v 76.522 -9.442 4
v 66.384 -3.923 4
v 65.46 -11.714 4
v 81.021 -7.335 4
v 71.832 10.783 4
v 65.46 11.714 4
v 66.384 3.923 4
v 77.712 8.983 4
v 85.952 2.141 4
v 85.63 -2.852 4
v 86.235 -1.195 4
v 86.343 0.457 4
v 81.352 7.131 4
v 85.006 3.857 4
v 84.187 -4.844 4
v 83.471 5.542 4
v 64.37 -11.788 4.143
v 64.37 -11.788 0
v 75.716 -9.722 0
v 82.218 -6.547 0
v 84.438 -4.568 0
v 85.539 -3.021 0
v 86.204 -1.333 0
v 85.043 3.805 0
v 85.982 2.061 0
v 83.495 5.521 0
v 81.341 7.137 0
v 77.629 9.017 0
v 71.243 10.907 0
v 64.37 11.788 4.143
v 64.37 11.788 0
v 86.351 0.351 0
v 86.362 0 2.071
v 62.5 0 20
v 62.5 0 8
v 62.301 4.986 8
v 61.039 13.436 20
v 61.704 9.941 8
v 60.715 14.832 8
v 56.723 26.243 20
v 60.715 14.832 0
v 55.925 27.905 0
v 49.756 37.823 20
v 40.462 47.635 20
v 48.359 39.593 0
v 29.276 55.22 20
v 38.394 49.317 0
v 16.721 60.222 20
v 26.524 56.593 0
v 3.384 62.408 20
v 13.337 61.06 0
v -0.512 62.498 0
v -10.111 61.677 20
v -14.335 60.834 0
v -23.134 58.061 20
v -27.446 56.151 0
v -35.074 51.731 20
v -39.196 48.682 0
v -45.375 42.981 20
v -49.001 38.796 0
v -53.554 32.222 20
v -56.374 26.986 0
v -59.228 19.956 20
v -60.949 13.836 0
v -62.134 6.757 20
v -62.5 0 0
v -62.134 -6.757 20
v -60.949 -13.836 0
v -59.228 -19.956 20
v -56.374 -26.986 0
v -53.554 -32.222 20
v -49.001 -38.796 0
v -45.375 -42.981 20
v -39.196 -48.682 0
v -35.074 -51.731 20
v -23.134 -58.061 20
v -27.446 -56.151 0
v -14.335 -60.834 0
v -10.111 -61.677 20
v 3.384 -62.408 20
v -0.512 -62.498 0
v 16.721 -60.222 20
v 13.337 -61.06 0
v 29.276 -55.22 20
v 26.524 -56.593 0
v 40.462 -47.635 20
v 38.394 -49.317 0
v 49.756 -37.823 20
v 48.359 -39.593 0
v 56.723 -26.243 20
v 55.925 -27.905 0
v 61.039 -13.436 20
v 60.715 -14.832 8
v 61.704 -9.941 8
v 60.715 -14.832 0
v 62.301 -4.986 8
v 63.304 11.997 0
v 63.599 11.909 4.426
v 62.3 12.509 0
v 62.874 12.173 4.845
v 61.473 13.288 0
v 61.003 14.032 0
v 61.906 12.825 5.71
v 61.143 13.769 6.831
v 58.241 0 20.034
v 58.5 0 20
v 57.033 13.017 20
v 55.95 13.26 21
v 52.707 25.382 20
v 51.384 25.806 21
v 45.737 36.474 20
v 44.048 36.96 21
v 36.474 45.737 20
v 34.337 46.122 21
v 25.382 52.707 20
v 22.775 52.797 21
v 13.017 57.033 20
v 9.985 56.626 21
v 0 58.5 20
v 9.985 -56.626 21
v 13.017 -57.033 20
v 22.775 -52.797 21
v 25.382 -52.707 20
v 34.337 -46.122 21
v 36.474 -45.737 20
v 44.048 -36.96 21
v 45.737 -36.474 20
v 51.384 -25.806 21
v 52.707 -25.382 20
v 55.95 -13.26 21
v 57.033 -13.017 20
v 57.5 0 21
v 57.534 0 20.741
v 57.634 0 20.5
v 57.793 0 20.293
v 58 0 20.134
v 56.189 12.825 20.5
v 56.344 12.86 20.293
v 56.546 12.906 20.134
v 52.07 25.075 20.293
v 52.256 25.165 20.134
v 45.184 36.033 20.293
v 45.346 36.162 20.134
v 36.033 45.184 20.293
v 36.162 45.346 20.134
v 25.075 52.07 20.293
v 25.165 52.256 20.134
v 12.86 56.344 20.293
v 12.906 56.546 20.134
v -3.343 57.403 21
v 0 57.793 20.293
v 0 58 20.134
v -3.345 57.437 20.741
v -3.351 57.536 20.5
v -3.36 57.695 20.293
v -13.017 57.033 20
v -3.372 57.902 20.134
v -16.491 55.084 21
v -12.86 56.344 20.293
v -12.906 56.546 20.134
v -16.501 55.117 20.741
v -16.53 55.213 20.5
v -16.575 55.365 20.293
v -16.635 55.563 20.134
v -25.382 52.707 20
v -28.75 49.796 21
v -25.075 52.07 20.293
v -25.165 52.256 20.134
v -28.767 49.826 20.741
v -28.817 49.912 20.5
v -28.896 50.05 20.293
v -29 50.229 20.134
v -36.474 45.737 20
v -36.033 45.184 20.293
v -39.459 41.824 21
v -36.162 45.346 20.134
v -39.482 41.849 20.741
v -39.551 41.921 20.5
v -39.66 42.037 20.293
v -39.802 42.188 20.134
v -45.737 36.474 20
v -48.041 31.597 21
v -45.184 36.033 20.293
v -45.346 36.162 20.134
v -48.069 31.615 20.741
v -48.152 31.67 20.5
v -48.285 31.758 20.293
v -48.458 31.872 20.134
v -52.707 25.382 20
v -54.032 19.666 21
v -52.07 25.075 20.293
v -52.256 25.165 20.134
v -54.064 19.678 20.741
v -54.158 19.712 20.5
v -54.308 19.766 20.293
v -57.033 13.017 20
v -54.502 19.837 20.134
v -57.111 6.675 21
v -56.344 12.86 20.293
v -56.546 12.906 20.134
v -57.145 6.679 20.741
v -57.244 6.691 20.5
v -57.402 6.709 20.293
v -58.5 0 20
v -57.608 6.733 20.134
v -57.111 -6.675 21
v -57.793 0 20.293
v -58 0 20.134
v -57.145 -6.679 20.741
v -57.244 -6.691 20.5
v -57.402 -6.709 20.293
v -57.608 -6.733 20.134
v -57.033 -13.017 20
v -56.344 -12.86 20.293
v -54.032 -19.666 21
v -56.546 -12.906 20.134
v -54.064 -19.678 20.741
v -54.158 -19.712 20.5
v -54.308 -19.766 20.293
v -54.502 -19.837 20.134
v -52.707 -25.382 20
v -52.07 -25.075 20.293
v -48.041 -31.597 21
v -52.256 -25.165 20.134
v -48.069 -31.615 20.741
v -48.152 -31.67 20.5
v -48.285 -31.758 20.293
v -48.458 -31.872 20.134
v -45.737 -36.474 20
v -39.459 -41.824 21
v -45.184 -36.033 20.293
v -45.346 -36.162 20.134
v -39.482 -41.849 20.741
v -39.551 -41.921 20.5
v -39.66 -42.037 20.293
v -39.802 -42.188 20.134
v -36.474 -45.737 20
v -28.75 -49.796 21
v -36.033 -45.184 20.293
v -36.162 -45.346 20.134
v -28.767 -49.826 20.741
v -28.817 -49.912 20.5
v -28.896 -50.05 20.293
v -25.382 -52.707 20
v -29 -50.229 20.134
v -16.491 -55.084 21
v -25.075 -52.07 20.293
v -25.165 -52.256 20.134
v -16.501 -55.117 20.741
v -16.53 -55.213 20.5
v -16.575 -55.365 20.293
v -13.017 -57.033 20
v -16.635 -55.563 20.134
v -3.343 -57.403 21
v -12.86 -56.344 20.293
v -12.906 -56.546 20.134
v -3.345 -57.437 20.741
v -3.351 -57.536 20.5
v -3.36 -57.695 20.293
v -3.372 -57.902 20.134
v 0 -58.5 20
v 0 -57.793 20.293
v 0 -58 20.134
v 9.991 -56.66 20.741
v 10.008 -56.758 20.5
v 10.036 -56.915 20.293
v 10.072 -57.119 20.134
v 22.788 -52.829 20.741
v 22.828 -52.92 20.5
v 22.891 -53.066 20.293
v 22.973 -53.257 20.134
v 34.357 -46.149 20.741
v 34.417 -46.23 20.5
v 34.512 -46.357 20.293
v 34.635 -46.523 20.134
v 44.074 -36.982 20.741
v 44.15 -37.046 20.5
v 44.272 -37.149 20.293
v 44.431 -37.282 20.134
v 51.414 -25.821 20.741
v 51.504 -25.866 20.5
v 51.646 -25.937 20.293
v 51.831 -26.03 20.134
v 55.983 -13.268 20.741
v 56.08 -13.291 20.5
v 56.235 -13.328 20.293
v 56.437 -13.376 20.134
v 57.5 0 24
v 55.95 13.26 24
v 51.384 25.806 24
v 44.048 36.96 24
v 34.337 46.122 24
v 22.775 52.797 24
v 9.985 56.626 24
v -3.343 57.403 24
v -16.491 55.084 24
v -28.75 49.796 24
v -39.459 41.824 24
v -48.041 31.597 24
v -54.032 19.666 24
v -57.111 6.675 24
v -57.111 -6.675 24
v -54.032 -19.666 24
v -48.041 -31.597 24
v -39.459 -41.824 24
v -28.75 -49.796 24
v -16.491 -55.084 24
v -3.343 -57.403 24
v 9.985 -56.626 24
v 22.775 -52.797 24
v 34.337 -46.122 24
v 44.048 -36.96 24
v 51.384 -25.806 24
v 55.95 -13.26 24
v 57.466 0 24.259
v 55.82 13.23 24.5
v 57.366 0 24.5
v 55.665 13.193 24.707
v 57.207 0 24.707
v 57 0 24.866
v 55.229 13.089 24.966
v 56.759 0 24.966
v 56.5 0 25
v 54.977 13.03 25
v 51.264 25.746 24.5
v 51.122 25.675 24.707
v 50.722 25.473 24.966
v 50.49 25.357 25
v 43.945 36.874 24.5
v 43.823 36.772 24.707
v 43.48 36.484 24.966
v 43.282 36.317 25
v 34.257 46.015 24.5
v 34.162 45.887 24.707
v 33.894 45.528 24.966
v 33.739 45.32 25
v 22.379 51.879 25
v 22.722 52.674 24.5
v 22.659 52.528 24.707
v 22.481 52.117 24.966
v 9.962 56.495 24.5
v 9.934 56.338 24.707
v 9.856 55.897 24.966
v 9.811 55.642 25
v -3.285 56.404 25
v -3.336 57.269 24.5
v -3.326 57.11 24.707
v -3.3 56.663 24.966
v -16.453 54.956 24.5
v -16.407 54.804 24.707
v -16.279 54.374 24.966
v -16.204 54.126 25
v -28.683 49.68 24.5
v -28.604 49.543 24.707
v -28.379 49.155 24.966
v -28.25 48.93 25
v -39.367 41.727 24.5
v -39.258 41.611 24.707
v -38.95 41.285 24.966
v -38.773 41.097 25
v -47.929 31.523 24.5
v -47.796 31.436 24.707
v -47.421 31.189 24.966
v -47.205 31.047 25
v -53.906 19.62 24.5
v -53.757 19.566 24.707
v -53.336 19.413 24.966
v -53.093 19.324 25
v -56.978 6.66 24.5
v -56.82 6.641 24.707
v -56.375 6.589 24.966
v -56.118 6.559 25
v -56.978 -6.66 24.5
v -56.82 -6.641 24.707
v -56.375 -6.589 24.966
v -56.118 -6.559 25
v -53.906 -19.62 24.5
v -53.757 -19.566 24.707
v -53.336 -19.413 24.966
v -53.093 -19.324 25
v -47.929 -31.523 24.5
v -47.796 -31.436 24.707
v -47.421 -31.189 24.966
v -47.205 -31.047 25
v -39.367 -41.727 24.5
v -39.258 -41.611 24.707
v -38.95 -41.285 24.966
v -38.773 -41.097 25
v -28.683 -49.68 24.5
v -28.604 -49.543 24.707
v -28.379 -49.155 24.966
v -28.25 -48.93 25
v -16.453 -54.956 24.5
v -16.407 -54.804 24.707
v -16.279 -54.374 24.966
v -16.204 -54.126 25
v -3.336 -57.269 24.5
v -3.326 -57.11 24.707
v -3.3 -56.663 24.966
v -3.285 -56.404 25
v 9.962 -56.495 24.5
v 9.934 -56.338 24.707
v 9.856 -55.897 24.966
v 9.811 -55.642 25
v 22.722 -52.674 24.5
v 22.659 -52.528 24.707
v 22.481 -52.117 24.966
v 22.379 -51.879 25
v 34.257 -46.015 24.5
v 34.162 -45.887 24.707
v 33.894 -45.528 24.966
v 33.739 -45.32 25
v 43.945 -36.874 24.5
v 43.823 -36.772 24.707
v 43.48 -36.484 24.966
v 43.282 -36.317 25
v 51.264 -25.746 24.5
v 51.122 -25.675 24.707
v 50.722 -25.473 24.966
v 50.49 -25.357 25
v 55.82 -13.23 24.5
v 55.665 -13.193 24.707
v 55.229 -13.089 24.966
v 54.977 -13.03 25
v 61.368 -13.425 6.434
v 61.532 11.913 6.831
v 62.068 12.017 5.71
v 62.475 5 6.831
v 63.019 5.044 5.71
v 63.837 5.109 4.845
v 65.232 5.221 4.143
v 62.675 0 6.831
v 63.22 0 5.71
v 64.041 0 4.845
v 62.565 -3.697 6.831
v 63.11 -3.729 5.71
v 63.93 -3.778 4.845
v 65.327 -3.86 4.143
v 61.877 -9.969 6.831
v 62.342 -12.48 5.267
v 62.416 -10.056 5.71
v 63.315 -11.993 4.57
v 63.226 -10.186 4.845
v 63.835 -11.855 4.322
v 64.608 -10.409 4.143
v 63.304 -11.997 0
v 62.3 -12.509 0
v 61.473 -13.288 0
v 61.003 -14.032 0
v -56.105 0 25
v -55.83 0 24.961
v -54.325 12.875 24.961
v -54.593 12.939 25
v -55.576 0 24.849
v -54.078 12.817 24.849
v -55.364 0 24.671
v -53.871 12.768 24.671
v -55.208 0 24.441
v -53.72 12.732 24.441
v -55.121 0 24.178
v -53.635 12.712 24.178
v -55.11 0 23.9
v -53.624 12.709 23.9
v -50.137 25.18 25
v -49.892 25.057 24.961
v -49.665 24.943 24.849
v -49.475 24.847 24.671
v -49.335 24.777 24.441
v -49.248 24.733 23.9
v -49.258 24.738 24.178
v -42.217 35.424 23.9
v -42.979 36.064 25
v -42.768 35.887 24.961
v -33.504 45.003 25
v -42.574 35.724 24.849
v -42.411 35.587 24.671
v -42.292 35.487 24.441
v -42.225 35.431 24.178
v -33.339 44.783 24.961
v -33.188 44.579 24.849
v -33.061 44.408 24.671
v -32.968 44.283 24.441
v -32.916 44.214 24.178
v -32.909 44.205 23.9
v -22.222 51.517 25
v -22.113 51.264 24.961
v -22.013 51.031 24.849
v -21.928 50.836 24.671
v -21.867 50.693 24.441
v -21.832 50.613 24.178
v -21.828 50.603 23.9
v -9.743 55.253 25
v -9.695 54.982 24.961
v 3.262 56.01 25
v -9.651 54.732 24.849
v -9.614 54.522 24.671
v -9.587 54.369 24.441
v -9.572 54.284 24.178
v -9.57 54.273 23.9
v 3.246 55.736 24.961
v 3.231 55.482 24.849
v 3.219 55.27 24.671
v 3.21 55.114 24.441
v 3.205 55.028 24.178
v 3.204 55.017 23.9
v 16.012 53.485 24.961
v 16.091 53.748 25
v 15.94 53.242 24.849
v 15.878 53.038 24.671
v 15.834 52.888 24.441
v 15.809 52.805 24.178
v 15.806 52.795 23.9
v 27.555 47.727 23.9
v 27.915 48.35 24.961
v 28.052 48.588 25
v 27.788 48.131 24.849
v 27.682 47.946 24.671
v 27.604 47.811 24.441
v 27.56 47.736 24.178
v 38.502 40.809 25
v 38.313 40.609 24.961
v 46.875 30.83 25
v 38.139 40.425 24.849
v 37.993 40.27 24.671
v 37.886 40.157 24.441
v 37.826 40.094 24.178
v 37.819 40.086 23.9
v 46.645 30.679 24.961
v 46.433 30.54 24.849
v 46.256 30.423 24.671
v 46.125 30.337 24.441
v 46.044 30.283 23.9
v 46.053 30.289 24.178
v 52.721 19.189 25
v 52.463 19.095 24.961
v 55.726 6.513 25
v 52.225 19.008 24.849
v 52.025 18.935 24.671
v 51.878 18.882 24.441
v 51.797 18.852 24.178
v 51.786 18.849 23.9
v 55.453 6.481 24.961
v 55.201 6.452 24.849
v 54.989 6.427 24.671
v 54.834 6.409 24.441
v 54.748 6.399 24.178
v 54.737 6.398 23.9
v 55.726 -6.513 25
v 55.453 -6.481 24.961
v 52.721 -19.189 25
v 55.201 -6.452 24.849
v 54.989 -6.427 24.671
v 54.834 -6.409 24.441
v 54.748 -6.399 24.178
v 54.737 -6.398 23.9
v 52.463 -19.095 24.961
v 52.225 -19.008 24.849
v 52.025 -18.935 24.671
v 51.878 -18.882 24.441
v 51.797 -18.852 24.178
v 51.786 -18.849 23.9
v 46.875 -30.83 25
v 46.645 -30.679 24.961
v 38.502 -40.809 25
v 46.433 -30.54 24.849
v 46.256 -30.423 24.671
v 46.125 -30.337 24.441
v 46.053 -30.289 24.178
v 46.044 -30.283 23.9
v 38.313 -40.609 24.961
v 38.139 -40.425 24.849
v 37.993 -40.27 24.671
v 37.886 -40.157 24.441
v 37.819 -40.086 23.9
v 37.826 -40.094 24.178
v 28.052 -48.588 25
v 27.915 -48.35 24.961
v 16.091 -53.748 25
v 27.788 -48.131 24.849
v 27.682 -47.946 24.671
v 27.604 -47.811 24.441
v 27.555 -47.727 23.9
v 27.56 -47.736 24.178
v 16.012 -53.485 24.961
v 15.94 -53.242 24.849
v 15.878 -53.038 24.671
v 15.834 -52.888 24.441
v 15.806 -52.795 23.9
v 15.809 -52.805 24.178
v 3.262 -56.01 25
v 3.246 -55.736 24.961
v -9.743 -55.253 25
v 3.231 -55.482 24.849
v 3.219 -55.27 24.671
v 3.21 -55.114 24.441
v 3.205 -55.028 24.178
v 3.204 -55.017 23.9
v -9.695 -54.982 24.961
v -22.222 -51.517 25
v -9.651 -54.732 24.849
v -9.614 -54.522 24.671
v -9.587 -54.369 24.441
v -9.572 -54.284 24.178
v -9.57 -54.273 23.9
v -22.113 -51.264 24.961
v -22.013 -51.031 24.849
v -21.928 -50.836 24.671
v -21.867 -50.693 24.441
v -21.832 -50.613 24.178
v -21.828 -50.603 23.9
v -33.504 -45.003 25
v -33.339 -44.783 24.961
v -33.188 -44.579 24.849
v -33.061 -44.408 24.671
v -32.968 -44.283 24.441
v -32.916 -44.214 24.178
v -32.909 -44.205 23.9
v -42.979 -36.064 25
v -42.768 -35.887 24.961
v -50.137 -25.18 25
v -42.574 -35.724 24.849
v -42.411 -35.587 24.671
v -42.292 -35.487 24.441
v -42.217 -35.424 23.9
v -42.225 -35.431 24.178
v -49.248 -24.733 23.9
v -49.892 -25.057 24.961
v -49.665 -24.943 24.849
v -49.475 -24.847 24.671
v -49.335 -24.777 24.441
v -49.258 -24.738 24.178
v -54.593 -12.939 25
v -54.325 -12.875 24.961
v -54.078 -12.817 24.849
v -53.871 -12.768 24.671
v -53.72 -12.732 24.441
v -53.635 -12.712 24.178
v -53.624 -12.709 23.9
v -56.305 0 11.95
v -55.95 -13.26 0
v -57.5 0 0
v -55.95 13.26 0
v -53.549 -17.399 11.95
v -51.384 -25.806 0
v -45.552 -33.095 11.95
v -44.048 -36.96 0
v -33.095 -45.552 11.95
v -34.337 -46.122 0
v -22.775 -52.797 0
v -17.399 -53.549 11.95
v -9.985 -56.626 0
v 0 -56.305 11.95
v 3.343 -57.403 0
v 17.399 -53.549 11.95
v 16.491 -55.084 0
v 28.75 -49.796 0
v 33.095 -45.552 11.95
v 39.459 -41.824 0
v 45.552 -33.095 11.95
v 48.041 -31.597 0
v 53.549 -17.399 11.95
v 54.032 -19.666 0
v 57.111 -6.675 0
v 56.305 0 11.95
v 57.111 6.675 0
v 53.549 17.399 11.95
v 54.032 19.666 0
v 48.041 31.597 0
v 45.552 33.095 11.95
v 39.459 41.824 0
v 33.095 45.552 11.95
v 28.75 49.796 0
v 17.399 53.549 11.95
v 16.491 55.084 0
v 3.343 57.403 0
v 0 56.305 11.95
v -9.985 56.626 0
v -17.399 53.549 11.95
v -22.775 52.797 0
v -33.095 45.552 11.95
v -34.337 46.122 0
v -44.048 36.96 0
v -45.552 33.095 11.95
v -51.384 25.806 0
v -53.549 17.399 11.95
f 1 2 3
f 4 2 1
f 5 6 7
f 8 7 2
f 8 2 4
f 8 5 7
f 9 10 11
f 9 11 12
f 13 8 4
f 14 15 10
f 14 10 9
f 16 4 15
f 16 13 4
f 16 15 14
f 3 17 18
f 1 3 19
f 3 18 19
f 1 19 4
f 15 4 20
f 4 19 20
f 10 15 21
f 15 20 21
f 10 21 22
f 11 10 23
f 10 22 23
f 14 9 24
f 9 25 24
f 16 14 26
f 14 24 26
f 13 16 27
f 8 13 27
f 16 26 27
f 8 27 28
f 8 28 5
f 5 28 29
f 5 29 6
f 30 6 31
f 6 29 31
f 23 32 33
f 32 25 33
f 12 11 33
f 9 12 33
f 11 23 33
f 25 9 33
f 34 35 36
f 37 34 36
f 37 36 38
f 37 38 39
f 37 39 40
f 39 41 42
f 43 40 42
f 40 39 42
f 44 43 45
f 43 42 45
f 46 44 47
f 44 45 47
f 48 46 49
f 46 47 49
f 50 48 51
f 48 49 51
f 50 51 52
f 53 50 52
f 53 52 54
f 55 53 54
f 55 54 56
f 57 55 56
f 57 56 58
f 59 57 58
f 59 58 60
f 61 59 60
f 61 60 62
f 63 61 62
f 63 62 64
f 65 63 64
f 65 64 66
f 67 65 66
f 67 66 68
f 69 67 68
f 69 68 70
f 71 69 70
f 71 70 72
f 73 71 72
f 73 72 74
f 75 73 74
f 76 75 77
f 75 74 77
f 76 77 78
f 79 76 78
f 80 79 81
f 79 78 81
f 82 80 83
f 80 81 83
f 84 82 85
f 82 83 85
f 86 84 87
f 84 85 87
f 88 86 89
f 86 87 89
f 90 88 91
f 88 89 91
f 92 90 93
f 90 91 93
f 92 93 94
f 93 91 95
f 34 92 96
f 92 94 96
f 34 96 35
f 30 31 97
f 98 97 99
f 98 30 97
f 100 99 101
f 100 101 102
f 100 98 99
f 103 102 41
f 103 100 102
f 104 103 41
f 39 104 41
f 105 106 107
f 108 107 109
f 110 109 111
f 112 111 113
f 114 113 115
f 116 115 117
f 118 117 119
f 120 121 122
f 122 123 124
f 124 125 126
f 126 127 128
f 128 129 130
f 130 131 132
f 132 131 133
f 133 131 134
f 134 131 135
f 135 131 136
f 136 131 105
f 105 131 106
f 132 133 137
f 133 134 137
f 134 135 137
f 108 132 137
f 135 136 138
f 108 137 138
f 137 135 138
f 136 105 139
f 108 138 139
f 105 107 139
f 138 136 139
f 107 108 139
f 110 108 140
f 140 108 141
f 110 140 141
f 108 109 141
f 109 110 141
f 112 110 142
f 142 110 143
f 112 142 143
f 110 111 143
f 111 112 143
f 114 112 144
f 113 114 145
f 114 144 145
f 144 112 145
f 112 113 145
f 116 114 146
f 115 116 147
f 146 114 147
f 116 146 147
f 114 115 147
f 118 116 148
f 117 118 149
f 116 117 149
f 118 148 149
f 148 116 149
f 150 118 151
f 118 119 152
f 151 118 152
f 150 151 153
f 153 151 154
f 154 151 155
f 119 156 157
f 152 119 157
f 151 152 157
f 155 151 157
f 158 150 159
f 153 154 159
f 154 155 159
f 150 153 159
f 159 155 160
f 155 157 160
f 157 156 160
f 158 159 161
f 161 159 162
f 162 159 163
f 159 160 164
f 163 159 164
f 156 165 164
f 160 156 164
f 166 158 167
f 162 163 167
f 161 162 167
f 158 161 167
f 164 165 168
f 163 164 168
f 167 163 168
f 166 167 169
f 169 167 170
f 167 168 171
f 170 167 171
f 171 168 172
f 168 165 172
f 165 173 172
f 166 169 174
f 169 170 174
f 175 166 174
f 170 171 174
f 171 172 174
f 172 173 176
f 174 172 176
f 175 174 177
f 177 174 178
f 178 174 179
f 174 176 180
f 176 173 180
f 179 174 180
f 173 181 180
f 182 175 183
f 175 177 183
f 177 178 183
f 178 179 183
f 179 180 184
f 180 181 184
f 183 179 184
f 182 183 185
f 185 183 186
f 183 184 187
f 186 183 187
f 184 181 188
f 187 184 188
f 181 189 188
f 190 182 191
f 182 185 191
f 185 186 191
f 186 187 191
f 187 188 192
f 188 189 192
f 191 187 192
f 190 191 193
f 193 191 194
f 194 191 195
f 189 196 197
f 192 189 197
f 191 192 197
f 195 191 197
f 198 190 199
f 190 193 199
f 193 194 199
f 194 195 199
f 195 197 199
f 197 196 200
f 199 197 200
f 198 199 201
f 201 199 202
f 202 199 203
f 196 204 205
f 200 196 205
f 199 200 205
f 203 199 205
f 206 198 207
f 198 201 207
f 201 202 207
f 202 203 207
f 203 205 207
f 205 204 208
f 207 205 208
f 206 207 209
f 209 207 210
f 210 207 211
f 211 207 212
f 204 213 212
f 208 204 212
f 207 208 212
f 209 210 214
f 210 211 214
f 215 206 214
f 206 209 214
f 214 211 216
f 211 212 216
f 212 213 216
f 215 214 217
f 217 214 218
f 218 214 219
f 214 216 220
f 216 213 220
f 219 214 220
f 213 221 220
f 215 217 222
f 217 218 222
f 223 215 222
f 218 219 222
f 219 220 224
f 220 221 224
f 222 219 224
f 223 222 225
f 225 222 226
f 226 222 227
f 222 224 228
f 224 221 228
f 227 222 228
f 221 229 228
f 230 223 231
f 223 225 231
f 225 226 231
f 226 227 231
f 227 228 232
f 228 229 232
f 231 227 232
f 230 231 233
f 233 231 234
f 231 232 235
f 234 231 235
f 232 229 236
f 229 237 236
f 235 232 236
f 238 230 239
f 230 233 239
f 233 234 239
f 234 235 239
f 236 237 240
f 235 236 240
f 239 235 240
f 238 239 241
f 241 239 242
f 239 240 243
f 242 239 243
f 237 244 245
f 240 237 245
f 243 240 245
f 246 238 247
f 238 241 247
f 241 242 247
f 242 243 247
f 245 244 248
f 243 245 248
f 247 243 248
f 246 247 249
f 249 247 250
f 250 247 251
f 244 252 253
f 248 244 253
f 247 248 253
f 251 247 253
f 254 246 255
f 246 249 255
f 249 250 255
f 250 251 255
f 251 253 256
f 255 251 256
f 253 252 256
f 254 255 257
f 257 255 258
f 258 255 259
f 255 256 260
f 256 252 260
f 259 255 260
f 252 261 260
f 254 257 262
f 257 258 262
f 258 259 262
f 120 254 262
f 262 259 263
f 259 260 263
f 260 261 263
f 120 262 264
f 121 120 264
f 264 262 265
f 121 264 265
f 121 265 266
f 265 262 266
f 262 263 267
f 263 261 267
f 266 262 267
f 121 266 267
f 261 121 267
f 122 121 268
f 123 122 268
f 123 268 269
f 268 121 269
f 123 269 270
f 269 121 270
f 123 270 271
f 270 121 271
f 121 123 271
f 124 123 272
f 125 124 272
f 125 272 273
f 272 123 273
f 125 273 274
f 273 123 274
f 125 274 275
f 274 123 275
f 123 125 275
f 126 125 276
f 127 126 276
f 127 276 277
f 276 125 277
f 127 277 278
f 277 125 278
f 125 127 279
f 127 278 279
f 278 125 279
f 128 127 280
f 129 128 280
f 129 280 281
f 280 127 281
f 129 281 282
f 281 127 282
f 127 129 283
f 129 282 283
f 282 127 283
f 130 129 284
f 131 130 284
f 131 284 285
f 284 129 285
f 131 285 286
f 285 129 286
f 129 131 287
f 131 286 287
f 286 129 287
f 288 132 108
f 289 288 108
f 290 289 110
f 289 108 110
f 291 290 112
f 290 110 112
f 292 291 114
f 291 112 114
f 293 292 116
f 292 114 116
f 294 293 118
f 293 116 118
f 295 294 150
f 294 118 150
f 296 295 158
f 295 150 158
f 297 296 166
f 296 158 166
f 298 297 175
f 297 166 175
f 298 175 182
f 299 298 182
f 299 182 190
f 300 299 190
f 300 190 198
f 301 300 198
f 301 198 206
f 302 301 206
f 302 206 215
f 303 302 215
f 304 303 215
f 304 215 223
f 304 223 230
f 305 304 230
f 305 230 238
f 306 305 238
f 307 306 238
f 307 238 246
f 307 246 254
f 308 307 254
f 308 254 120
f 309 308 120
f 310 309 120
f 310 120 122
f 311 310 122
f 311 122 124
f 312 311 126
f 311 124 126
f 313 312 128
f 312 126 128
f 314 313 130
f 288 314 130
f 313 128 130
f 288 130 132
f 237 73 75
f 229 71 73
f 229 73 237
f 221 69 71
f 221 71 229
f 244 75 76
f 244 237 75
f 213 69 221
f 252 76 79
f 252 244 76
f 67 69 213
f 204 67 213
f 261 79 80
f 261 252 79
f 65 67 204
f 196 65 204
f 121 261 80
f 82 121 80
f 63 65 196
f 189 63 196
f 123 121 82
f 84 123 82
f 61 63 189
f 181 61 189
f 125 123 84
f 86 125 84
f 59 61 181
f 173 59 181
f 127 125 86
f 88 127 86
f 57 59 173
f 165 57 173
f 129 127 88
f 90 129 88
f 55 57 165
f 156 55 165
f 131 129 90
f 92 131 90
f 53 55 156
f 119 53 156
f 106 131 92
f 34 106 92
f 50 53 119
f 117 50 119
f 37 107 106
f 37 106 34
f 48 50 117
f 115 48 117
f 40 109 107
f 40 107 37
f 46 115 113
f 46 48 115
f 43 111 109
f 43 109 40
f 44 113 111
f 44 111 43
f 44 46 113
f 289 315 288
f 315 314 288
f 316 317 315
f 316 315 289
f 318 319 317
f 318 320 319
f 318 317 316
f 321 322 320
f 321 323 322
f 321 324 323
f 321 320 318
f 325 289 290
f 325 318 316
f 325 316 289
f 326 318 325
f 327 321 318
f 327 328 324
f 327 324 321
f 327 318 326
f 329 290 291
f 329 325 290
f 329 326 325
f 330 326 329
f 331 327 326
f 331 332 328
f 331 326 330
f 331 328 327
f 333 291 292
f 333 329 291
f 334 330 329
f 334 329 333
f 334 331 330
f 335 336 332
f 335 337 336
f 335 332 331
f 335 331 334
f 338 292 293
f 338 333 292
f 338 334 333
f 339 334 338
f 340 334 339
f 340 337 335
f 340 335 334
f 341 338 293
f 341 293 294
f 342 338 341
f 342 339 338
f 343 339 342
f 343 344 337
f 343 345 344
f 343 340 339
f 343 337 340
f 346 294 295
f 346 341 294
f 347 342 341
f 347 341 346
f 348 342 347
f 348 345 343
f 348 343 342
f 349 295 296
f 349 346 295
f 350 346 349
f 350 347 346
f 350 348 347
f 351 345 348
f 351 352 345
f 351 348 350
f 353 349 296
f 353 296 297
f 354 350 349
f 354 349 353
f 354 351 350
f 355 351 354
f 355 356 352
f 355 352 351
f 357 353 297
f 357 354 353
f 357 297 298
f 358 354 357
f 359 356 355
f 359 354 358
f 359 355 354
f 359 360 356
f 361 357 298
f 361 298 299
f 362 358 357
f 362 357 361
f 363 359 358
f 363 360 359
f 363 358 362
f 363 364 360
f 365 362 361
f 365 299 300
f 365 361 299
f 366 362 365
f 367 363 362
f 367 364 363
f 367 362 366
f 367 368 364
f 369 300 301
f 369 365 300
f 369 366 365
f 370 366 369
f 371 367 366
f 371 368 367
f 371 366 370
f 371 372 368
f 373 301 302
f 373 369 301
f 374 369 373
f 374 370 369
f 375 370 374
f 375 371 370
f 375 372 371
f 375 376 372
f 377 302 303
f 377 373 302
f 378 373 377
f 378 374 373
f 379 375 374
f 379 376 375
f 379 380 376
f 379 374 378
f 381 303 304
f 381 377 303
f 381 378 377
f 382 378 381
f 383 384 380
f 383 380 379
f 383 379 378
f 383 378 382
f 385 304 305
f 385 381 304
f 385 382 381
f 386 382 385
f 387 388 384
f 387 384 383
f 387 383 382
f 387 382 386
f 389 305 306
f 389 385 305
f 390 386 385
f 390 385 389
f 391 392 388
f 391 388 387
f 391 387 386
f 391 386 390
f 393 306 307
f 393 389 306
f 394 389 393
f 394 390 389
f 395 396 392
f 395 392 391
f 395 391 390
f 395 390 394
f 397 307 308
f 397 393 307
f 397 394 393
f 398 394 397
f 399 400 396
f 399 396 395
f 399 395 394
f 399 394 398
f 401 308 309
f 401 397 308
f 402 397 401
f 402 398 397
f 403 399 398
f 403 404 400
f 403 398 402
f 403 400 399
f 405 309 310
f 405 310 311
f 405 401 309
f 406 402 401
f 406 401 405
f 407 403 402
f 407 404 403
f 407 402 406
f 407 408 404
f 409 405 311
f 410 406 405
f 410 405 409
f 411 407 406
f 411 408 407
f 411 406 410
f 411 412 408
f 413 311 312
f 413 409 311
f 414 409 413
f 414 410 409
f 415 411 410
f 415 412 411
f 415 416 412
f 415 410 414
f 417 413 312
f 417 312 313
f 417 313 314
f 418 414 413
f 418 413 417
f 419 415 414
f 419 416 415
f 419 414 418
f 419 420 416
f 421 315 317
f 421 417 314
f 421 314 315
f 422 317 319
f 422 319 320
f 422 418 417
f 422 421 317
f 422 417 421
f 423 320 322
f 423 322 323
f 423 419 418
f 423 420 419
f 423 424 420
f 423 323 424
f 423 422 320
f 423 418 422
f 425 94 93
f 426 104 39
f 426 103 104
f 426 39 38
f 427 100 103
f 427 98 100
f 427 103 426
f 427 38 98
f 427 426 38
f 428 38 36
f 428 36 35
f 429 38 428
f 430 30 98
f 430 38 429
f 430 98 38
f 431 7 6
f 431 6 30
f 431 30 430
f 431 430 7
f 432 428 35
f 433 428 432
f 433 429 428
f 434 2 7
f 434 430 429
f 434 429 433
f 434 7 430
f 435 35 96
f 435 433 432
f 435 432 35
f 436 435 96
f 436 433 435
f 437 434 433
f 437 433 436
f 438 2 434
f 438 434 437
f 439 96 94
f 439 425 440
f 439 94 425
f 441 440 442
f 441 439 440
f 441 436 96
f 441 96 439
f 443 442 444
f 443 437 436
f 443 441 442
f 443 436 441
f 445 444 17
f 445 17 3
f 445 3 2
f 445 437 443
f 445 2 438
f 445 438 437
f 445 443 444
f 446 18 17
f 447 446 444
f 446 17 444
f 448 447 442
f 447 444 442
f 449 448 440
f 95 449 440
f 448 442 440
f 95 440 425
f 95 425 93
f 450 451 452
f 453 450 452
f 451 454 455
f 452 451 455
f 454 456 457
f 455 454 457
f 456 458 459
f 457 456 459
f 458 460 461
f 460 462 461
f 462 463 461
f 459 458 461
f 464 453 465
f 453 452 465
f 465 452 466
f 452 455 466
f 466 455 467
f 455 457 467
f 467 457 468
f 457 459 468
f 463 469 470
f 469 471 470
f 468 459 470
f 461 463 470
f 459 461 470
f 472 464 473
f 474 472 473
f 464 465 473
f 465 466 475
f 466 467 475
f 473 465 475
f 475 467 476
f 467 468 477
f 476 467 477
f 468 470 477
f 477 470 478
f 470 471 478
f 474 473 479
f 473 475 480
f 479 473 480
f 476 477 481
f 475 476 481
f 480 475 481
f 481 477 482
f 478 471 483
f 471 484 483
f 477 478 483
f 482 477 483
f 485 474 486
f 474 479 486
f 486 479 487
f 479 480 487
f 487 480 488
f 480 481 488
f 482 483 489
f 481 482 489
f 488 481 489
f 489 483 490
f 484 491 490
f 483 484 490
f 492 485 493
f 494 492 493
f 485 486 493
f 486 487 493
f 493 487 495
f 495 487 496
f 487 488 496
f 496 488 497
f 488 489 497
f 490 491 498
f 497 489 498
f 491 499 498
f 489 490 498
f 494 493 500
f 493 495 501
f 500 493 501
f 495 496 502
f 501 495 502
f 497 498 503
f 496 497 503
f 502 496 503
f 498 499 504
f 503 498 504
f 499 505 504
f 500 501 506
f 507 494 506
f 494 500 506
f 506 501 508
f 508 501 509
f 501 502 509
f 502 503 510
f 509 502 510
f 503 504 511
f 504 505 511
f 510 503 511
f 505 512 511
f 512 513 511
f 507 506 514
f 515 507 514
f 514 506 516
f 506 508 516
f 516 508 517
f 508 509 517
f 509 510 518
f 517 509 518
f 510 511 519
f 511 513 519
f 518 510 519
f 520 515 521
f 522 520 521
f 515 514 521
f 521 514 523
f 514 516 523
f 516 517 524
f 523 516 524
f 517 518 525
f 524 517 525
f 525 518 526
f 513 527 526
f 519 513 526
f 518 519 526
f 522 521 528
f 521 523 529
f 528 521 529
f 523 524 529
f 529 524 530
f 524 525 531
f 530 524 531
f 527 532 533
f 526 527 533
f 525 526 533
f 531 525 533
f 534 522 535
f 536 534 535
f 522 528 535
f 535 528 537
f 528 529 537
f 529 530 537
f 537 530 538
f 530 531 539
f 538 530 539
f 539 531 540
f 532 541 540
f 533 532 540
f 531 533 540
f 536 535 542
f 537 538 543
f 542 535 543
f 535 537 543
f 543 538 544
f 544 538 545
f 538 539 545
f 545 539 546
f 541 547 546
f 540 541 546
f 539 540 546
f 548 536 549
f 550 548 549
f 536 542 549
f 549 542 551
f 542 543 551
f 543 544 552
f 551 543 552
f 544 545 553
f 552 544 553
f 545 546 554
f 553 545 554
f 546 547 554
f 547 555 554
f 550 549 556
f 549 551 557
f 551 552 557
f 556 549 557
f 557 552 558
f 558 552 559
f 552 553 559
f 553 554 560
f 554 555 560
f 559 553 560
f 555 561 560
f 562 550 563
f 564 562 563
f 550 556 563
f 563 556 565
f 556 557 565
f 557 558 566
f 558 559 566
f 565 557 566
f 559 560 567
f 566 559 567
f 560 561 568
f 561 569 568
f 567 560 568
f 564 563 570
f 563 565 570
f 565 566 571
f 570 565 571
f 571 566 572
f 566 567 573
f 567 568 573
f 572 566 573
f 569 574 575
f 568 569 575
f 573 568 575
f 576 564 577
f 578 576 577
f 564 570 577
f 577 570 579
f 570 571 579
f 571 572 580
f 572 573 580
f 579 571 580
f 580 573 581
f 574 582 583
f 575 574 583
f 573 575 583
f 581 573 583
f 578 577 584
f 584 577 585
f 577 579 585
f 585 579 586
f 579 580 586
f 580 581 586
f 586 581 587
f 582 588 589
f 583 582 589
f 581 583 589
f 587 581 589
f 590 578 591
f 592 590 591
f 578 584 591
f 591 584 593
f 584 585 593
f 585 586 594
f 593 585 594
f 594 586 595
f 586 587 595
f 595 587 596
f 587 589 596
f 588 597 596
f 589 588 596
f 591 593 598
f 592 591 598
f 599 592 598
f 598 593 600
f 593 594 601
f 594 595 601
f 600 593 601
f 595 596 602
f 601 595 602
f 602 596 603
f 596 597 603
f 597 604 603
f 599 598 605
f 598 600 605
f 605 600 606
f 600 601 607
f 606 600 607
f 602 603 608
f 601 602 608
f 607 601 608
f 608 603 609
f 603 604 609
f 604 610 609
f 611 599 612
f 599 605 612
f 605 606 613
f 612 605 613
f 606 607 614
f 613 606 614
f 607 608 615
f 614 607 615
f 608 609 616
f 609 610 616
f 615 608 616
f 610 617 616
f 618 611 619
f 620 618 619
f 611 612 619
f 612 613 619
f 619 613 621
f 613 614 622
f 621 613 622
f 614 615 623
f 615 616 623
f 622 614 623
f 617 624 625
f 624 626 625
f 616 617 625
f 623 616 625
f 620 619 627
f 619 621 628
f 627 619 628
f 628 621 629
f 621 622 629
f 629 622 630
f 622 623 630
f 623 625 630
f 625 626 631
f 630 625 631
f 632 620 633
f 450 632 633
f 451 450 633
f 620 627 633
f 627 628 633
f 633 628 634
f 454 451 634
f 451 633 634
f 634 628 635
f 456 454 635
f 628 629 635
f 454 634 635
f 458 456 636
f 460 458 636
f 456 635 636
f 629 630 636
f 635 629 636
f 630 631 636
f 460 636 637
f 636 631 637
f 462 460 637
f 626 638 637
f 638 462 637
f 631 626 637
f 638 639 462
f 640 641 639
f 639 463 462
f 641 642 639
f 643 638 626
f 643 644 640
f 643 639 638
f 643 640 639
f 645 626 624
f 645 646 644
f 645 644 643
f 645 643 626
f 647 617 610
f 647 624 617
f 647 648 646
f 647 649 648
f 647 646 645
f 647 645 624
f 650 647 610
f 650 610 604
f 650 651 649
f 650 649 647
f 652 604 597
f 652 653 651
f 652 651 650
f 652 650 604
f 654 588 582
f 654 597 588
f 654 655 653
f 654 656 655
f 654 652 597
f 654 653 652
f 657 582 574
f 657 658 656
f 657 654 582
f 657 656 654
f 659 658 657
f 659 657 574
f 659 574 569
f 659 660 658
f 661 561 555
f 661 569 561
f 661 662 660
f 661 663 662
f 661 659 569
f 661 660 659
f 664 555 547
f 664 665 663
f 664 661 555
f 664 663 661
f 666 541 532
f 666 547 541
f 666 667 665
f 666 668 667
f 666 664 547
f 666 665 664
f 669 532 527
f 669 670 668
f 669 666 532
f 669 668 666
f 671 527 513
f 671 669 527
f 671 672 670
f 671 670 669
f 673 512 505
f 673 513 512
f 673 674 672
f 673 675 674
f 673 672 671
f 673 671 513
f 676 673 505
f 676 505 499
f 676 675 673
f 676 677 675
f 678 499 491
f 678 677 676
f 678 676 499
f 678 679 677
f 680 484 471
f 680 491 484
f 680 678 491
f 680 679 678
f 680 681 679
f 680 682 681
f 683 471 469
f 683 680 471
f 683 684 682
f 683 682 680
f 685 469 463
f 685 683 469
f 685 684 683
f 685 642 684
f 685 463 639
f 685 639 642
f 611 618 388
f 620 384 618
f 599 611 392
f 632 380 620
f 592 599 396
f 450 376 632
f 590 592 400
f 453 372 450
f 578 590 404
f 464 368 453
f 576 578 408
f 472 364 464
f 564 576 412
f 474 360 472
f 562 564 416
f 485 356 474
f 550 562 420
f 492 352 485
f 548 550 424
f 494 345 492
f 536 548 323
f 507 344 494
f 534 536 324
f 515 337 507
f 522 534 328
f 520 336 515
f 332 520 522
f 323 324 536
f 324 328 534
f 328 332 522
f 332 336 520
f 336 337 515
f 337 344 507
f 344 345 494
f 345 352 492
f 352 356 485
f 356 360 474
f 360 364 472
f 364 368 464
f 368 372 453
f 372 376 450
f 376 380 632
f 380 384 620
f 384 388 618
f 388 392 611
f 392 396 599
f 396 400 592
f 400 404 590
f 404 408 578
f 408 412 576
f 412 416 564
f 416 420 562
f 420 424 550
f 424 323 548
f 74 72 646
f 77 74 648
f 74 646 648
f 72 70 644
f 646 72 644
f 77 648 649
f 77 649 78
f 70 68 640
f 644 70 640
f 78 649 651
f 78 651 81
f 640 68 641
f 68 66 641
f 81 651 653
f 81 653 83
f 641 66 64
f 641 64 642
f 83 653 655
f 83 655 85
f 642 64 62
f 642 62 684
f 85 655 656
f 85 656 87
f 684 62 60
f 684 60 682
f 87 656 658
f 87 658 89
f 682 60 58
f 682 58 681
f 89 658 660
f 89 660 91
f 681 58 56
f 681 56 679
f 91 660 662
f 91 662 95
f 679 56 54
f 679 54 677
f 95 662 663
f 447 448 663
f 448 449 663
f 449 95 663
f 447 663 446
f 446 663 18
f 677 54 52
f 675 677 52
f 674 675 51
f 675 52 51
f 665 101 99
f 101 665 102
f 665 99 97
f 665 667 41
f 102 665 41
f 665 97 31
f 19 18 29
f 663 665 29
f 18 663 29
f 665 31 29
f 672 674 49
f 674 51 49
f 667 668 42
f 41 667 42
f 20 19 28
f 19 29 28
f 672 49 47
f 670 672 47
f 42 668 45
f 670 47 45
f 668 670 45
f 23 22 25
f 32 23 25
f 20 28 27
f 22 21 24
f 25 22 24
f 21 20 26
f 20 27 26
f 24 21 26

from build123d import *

# Parameters (mm, degrees)
SKETCH_R        = 62.5
PAD_DEPTH       = 20
SKETCH001_R     = 57.5
POCKET_DEPTH    = 20.001
SKETCH002_R     = 57.5
PAD001_DEPTH    = 25
SKETCH003_R     = 55
POCKET001_DEPTH = 25.001
FILLET_R        = 1
PAD002_DEPTH    = 4
FILLET001_R     = 4


with BuildPart() as part:
    # Sketch → Pad (new body)
    with BuildSketch(Plane.XY):
        Circle(SKETCH_R)
    extrude(amount=PAD_DEPTH)

    # Sketch001 (on Face3 of Pad) → Pocket (cut, through all)
    with BuildSketch(Plane.XY.offset(20)):
        Circle(SKETCH001_R)
    extrude(amount=-POCKET_DEPTH, mode=Mode.SUBTRACT)

    # Sketch002 → Pad001 (join)
    with BuildSketch(Plane.XY):
        Circle(SKETCH002_R)
    extrude(amount=PAD001_DEPTH)

    # Sketch003 (on Face6 of Pad001) → Pocket001 (cut, through all)
    with BuildSketch(Plane.XY.offset(25)):
        Circle(SKETCH003_R)
    extrude(amount=-POCKET001_DEPTH, mode=Mode.SUBTRACT)

    # Sketch004 → Groove (revolve, cut)
    with BuildSketch(Plane.XZ):
        Polygon((-57.5, 0), (-55, 0), (-55, 25), align=None)
    revolve(axis=Axis((0, 0, 0), (0, 0, 1)), mode=Mode.SUBTRACT)

    # Fillet
    fillet_edges = [part.edges().sort_by_distance(p)[0] for p in [
        (-57.5, 0, 25),
        (0, 55, 25),
        (0, -55, 25),
        (-57.5, 0, 20),
        (57.5, 0, 22.5),
    ]]
    fillet(fillet_edges, radius=FILLET_R)

    # Sketch005 → Pad002 (join)
    with BuildSketch(Plane.XY):
        with BuildLine():
            add(Edge.make_bspline(
                [(61.361633, -11.874342), (86.361633, -11.874342), (86.361633, 0), (86.361633, 11.874342), (61.361633, 11.874342)],
                knots=[4.712389, 4.712389, 4.712389, 6.283185, 6.283185, 7.853982, 7.853982, 7.853982], degree=2, weights=[1, 0.707107, 1, 0.707107, 1]))
            ThreePointArc((61.361633, 11.874342), (62.5, 0), (61.361633, -11.874342))
        make_face()
    extrude(amount=PAD002_DEPTH)

    # Fillet001
    fillet001_edges = [part.edges().sort_by_distance(p)[0] for p in [
        (61.361633, -11.874342, 2),
        (62.214757, -5.964392, 4),
        (62.214757, 5.964392, 4),
        (61.361633, 11.874342, 2),
    ]]
    fillet(fillet001_edges, radius=FILLET001_R)


solid = part.part
